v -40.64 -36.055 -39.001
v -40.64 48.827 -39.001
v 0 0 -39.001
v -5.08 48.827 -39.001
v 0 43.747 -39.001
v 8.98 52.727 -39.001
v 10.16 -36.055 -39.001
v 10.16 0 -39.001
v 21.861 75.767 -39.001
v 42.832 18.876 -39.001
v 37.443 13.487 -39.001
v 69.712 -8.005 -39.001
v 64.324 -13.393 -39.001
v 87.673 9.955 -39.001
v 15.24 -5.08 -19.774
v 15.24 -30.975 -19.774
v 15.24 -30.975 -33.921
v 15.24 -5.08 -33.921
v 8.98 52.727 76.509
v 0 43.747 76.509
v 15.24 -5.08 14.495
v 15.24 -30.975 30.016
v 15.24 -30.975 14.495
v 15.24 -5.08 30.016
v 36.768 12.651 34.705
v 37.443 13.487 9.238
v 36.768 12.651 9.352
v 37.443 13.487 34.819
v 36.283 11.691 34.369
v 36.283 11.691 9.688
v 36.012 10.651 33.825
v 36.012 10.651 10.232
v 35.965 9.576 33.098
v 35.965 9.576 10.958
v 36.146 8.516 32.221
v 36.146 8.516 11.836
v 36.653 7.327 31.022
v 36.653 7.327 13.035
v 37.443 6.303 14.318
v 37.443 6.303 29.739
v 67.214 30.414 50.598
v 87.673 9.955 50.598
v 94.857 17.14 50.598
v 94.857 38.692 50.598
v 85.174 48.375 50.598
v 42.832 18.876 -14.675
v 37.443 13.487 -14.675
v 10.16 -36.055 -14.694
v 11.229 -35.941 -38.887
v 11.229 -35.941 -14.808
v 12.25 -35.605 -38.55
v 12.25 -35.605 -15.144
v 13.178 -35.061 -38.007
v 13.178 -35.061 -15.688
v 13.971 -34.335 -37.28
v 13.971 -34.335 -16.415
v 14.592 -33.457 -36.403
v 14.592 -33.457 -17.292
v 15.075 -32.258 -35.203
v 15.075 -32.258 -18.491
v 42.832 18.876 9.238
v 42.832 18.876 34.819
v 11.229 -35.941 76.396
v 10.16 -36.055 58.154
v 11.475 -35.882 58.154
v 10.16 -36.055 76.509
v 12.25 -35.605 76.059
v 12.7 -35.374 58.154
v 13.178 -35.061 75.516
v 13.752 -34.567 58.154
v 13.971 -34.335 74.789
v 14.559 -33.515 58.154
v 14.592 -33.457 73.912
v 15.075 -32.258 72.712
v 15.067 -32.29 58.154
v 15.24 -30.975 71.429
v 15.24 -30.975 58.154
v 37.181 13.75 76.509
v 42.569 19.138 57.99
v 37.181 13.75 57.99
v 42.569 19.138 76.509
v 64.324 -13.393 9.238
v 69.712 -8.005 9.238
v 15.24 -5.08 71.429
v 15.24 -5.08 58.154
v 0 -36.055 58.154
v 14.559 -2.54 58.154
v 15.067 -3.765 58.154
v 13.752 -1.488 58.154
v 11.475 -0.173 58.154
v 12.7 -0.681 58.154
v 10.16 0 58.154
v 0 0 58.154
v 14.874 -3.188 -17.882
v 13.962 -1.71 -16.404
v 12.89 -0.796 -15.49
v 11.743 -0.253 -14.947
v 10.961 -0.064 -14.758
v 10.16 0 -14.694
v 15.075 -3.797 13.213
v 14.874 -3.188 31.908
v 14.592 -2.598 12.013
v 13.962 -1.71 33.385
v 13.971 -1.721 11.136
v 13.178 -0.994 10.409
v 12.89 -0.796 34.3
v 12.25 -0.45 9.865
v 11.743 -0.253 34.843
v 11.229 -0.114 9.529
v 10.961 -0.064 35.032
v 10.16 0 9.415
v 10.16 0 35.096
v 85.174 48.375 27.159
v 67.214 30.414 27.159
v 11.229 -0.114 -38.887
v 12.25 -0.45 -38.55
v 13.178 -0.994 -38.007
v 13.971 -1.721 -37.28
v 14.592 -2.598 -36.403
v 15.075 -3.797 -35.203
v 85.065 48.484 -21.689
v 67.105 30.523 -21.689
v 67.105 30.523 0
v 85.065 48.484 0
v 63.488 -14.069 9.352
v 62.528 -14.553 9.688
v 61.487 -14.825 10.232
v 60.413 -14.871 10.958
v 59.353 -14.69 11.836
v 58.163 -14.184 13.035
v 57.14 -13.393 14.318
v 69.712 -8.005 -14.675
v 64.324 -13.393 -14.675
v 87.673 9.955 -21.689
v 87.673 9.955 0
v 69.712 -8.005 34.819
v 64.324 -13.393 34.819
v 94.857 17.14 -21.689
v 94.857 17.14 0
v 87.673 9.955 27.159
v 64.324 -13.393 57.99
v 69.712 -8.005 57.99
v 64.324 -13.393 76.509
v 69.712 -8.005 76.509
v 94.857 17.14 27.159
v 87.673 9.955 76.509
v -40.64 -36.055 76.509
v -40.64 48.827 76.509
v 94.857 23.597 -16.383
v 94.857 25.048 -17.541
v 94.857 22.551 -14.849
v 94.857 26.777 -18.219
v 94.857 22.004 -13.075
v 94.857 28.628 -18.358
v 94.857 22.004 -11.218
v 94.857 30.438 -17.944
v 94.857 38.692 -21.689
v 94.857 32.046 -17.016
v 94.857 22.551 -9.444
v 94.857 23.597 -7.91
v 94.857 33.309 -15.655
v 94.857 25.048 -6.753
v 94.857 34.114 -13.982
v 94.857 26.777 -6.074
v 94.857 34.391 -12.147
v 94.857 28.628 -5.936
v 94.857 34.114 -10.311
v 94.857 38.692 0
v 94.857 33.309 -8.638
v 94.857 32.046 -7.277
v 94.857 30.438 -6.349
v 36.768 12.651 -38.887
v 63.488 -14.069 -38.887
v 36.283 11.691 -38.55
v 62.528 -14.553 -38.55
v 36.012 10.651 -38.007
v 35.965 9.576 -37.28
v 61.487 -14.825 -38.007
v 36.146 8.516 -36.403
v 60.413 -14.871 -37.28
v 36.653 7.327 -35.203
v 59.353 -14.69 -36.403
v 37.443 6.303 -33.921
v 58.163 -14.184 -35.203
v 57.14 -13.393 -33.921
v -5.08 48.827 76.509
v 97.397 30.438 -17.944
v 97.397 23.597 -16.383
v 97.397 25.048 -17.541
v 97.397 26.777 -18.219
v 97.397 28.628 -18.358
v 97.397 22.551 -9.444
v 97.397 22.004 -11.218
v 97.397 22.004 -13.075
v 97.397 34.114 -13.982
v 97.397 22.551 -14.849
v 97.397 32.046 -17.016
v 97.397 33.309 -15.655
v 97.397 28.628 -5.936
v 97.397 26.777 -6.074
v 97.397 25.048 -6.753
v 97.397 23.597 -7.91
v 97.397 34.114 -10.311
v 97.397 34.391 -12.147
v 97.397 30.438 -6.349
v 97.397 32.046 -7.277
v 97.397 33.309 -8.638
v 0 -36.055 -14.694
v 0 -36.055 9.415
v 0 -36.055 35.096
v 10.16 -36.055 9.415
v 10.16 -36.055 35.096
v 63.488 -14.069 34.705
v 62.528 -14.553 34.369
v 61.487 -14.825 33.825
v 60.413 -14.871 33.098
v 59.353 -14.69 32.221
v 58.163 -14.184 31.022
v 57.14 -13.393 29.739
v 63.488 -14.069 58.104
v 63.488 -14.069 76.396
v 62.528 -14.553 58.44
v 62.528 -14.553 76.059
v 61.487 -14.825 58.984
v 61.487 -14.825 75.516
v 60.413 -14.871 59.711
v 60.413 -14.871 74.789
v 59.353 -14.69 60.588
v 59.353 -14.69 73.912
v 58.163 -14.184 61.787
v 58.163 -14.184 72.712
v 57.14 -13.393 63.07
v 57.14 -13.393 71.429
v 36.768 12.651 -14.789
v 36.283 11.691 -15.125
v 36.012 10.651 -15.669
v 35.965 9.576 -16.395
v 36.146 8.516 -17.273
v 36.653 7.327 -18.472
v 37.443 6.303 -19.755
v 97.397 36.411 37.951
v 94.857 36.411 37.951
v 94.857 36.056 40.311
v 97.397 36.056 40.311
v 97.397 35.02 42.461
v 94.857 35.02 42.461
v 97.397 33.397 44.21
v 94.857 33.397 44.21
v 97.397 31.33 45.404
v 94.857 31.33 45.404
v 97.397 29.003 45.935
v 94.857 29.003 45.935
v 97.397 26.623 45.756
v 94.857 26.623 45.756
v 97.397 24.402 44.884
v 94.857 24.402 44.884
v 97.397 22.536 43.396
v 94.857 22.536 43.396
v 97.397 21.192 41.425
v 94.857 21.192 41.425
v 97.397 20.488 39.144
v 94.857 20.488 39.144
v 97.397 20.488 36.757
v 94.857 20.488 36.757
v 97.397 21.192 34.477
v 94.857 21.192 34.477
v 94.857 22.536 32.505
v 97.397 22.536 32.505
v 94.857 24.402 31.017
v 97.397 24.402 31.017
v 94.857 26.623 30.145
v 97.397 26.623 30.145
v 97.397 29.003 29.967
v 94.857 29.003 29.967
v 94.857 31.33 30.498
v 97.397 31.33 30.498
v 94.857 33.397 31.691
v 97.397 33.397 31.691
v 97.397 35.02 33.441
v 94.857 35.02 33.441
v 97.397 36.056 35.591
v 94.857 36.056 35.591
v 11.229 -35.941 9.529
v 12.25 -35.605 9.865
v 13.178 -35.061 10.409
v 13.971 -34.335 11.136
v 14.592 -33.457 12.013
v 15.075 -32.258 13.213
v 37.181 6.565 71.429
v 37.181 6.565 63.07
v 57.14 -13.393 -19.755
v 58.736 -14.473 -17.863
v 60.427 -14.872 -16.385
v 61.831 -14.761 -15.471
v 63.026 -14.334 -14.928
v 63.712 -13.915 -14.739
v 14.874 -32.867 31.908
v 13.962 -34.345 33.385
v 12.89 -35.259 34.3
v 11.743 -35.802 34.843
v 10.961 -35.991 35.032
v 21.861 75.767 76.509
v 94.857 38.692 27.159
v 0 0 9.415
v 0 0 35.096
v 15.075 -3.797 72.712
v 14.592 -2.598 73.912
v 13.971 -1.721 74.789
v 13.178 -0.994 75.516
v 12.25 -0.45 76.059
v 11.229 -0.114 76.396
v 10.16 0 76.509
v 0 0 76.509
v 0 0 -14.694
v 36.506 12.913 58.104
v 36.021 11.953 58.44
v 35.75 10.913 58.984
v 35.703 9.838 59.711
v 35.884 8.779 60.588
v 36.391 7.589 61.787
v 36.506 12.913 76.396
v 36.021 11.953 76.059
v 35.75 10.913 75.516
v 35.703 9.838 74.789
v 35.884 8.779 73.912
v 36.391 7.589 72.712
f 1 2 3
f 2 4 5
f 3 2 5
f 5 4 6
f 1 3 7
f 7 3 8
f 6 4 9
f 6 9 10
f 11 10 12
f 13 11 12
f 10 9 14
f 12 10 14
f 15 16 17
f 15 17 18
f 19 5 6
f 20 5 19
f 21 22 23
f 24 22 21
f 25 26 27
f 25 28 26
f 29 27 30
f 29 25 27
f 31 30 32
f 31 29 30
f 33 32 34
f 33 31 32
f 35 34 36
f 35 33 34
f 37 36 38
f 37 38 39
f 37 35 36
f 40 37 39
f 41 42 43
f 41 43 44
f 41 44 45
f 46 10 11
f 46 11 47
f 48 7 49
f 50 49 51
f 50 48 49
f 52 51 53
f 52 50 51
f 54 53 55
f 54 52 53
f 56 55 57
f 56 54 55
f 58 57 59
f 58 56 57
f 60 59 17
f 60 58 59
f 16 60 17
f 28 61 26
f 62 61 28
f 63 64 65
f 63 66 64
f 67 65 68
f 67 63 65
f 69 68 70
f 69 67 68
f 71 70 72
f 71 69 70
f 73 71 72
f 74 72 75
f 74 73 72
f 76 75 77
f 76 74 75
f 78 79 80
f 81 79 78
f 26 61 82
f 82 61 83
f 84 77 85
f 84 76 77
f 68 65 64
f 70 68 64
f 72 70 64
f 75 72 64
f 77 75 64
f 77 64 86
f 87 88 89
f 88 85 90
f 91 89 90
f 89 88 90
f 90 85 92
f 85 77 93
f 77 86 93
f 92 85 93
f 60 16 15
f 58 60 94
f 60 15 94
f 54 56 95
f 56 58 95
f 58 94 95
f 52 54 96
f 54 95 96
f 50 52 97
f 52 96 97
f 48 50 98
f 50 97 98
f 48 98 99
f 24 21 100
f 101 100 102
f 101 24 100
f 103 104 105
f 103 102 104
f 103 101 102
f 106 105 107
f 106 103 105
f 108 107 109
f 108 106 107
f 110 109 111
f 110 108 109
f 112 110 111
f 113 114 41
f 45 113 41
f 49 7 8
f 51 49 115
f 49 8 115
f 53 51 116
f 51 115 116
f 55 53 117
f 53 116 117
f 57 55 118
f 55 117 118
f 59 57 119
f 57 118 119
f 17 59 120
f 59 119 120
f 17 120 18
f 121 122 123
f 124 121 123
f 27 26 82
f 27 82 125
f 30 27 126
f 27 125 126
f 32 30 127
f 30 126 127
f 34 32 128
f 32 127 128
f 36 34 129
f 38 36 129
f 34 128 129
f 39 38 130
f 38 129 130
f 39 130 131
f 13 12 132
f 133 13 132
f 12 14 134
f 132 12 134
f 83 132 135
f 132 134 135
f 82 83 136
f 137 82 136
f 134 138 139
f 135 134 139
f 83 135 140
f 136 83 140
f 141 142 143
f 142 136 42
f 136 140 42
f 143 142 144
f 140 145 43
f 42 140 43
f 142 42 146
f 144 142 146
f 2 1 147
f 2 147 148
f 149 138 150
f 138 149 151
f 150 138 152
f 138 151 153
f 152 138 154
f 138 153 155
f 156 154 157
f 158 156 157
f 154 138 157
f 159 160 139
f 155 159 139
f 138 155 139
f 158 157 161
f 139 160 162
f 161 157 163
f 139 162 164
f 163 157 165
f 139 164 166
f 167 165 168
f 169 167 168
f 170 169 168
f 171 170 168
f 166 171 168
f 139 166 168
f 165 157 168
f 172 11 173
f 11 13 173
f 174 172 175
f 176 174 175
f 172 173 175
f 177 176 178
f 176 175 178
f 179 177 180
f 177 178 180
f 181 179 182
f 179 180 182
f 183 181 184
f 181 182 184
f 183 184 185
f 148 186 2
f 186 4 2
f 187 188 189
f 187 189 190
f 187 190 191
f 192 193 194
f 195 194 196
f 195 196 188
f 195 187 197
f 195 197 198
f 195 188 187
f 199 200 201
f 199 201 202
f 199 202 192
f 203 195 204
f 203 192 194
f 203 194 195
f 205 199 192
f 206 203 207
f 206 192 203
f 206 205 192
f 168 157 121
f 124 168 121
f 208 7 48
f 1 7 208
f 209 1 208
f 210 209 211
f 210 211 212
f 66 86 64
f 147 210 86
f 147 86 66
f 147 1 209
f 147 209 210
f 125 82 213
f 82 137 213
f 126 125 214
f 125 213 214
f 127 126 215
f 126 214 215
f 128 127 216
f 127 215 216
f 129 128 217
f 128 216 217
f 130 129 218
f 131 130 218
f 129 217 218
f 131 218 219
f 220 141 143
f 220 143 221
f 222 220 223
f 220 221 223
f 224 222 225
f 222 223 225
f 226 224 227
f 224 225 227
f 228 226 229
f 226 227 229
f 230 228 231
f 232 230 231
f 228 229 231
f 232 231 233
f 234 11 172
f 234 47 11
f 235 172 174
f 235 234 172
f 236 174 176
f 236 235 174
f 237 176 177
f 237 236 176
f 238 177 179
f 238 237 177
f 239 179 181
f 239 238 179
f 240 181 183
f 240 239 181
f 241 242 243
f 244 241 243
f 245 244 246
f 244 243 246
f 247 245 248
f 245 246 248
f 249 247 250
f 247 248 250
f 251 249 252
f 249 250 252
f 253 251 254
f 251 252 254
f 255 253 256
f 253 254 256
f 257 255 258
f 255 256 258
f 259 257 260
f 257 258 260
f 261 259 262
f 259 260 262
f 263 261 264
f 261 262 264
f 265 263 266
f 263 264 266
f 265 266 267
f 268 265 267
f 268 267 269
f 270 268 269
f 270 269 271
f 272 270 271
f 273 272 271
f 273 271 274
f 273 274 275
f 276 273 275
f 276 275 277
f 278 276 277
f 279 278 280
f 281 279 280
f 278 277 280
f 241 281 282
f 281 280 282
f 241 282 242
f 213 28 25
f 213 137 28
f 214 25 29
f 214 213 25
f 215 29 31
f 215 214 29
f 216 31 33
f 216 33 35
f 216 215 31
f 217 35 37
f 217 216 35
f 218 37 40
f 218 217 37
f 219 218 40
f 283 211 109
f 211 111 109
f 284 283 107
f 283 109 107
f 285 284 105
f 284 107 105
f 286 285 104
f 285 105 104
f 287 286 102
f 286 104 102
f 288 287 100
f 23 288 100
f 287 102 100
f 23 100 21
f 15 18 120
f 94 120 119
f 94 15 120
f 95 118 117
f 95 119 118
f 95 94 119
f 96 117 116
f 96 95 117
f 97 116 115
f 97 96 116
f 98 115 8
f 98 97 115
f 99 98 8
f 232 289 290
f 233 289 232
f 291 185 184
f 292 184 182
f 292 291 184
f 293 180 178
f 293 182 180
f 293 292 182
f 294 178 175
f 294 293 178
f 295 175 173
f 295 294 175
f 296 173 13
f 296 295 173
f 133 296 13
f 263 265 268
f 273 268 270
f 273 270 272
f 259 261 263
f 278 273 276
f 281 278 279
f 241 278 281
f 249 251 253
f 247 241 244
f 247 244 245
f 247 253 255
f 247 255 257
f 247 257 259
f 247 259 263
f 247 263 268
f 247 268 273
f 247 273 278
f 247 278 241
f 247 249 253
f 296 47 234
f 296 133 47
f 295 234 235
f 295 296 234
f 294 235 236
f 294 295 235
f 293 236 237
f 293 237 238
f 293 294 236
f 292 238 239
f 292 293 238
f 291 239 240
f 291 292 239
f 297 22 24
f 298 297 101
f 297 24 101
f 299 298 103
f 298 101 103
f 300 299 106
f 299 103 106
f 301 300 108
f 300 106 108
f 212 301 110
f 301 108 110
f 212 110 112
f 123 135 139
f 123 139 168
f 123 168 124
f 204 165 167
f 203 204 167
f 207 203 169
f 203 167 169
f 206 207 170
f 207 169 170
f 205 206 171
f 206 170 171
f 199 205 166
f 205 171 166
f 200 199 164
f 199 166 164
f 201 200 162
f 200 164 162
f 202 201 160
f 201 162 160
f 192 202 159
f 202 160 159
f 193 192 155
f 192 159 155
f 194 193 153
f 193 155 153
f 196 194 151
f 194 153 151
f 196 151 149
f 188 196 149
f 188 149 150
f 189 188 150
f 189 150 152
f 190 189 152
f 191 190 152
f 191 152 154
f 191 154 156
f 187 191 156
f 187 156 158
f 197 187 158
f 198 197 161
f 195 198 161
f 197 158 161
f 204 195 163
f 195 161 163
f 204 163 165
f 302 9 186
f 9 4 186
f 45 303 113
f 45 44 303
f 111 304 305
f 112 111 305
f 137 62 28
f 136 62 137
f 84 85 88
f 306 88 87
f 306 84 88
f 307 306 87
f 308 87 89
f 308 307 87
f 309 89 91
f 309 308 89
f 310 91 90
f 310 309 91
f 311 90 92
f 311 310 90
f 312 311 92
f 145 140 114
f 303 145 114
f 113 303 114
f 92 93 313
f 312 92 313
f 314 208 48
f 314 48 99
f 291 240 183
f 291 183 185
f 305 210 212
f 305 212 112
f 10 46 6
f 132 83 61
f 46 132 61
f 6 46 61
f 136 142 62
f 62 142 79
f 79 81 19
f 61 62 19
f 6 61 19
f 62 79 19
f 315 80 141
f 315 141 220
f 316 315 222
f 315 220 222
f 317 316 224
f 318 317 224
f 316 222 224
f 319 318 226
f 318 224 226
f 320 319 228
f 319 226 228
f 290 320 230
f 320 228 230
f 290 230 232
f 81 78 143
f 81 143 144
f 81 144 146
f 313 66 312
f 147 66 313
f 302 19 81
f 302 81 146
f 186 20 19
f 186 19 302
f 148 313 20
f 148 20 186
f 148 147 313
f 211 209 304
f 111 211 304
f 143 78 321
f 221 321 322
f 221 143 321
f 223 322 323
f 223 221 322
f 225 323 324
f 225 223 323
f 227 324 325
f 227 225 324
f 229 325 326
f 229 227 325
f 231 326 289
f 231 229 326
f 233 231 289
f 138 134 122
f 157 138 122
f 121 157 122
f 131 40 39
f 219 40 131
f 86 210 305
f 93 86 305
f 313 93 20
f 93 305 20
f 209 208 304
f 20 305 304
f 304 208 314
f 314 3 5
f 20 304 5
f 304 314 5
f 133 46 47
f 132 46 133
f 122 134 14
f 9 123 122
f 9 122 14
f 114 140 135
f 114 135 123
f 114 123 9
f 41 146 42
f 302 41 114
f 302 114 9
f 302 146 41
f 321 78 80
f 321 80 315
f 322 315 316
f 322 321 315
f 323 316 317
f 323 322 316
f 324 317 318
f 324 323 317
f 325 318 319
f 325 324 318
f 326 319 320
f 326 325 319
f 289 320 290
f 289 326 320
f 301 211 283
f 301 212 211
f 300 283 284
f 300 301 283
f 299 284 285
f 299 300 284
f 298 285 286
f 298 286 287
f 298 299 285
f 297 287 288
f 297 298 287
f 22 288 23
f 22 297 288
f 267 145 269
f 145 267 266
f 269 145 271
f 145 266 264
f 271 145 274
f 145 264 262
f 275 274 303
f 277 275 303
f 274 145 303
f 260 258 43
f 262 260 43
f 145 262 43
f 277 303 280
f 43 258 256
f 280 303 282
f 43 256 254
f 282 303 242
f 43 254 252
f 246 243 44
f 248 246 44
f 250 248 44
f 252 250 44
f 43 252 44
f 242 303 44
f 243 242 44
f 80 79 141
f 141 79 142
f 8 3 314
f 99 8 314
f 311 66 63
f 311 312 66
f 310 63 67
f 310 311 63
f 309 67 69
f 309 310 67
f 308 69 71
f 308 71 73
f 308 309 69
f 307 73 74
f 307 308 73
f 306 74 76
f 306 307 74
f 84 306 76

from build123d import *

# Parameters (mm, degrees)
F0_W      = 84.8816260695
F0_H      = 77.4099454284
F1_DEPTH  = 40.64
F2_DEPTH  = 38.1
F3_SIZE   = 5.08
F4_DEPTH  = 12.7
F5_W      = 93.0721817722
F5_H      = 115.5099454284
F6_DEPTH  = 25.4
F7_W      = 36.0550768673
F7_H      = 25.6806416437
F7_H_2    = 18.3557639778
F7_H_3    = 24.3065860122
F8_DEPTH  = 15.24
F9_W      = 38.0150713027
F9_H      = 24.3256706744
F9_H_2    = 25.5810311064
F9_W_2    = 38.3858084679
F9_H_3    = 18.5193228483
F10_DEPTH = 12.7
F11_R     = 5.08
F12_W     = 29.0874056518
F12_H     = 21.6887369752
F12_W_2   = 28.9331488311
F12_H_2   = 23.4388820827
F13_DEPTH = 25.4
F14_SIZE  = 15.24
F15_R     = 8.0063032483
F15_R_2   = 6.2284075283
F16_DEPTH = 2.54


with BuildPart() as f1:
    # F0 (on Right) → F1 (new body)
    with BuildSketch(Plane.YZ):
        with Locations((6.3857361674, -0.295586884)):
            Rectangle(F0_W, F0_H)
    extrude(amount=-F1_DEPTH)

    # F2 (add): a face of the model
    f2_faces = [f1.faces().sort_by_distance(p)[0] for p in [
        (-20.32, 6.3857361674, 38.4093858302),
    ]]
    extrude(f2_faces, amount=F2_DEPTH)

    # F3
    f3_edges = [f1.edges().sort_by_distance(p)[0] for p in [
        (0, 48.826549, 18.754413),
    ]]
    chamfer(f3_edges, length=F3_SIZE)

    # F4 (add): a face of the model
    f4_faces = [f1.faces().sort_by_distance(p)[0] for p in [
        (-2.54, 46.2865492022, 18.754413116),
    ]]
    extrude(f4_faces, amount=F4_DEPTH)

    # F5 (on face) → F6 (join)
    with BuildSketch(Plane(origin=(30.8535307222, 30.8535307222, 0), x_dir=(-0.7071067812, 0.7071067812, 0), z_dir=(0.7071067812, 0.7071067812, 0))):
        with Locations((-8.4184043949, 18.754413116)):
            Rectangle(F5_W, F5_H)
    extrude(amount=F6_DEPTH)

    # F7 (on face) → F8 (join)
    with BuildSketch(Plane.YZ):
        with Locations((-18.0275384337, 22.2555273212)):
            Rectangle(F7_W, F7_H)
        with Locations((-18.0275384337, 67.3315038413)):
            Rectangle(F7_W, F7_H_2)
        with Locations((-18.0275384337, -26.8472665921)):
            Rectangle(F7_W, F7_H_3)
    extrude(amount=F8_DEPTH)

    # F9 (on face) → F10 (join)
    with BuildSketch(Plane(origin=(30.8535307222, 30.8535307222, 0), x_dir=(0.7071067812, -0.7071067812, 0), z_dir=(-0.7071067812, -0.7071067812, 0))):
        with Locations((35.9469596297, -26.837724261)):
            Rectangle(F9_W, F9_H)
        with Locations((35.9469596297, 22.0283274539)):
            Rectangle(F9_W, F9_H_2)
        with Locations((35.761591047, 67.249724406)):
            Rectangle(F9_W_2, F9_H_3)
    extrude(amount=F10_DEPTH)

    # F11
    f11_edges = [f1.edges().sort_by_distance(p)[0] for p in [
        (15.24, -36.055077, 67.331504),
        (15.24, -18.027538, 76.509386),
        (15.24, 0, 67.331504),
        (15.24, -18.027538, 35.095848),
        (15.24, -36.055077, 22.255527),
        (15.24, -18.027538, 9.415206),
        (15.24, 0, 22.255527),
        (15.24, -36.055077, -26.847267),
        (15.24, -18.027538, -39.00056),
        (15.24, 0, -26.847267),
        (15.24, -18.027538, -14.693974),
        (60.731971, -16.985422, 67.249724),
        (47.160538, -3.413989, 76.509386),
        (33.589105, 10.157444, 67.249724),
        (47.160538, -3.413989, 57.990063),
        (60.731971, -16.985422, 22.028327),
        (47.291614, -3.545064, 34.818843),
        (33.851256, 9.895293, 22.028327),
        (47.291614, -3.545064, 9.237812),
        (33.851256, 9.895293, -26.837724),
        (47.291614, -3.545064, -39.00056),
        (60.731971, -16.985422, -26.837724),
        (47.291614, -3.545064, -14.674889),
    ]]
    fillet(f11_edges, radius=F11_R)

    # F12 (on face) → F13 (join)
    with BuildSketch(Plane(origin=(48.8140429643, 48.8140429643, 0), x_dir=(-0.7071067812, 0.7071067812, 0), z_dir=(0.7071067812, 0.7071067812, 0))):
        with Locations((-40.4107924551, -10.8443684876)):
            Rectangle(F12_W, F12_H)
        with Locations((-40.4879208654, 38.8789121062)):
            Rectangle(F12_W_2, F12_H_2)
    extrude(amount=F13_DEPTH)

    # F14
    f14_edges = [f1.edges().sort_by_distance(p)[0] for p in [
        (105.633251, 27.915859, 38.878912),
        (105.633251, 27.915859, -10.844368),
    ]]
    chamfer(f14_edges, length=F14_SIZE)

    # F15 (on face) → F16 (join)
    with BuildSketch(Plane.YZ.offset(94.856944131)):
        with Locations((28.4049902111, 37.9507169127)):
            Circle(F15_R)
        with Locations((28.1626116484, -12.1466107666)):
            Circle(F15_R_2)
    extrude(amount=F16_DEPTH)


solid = f1.part
